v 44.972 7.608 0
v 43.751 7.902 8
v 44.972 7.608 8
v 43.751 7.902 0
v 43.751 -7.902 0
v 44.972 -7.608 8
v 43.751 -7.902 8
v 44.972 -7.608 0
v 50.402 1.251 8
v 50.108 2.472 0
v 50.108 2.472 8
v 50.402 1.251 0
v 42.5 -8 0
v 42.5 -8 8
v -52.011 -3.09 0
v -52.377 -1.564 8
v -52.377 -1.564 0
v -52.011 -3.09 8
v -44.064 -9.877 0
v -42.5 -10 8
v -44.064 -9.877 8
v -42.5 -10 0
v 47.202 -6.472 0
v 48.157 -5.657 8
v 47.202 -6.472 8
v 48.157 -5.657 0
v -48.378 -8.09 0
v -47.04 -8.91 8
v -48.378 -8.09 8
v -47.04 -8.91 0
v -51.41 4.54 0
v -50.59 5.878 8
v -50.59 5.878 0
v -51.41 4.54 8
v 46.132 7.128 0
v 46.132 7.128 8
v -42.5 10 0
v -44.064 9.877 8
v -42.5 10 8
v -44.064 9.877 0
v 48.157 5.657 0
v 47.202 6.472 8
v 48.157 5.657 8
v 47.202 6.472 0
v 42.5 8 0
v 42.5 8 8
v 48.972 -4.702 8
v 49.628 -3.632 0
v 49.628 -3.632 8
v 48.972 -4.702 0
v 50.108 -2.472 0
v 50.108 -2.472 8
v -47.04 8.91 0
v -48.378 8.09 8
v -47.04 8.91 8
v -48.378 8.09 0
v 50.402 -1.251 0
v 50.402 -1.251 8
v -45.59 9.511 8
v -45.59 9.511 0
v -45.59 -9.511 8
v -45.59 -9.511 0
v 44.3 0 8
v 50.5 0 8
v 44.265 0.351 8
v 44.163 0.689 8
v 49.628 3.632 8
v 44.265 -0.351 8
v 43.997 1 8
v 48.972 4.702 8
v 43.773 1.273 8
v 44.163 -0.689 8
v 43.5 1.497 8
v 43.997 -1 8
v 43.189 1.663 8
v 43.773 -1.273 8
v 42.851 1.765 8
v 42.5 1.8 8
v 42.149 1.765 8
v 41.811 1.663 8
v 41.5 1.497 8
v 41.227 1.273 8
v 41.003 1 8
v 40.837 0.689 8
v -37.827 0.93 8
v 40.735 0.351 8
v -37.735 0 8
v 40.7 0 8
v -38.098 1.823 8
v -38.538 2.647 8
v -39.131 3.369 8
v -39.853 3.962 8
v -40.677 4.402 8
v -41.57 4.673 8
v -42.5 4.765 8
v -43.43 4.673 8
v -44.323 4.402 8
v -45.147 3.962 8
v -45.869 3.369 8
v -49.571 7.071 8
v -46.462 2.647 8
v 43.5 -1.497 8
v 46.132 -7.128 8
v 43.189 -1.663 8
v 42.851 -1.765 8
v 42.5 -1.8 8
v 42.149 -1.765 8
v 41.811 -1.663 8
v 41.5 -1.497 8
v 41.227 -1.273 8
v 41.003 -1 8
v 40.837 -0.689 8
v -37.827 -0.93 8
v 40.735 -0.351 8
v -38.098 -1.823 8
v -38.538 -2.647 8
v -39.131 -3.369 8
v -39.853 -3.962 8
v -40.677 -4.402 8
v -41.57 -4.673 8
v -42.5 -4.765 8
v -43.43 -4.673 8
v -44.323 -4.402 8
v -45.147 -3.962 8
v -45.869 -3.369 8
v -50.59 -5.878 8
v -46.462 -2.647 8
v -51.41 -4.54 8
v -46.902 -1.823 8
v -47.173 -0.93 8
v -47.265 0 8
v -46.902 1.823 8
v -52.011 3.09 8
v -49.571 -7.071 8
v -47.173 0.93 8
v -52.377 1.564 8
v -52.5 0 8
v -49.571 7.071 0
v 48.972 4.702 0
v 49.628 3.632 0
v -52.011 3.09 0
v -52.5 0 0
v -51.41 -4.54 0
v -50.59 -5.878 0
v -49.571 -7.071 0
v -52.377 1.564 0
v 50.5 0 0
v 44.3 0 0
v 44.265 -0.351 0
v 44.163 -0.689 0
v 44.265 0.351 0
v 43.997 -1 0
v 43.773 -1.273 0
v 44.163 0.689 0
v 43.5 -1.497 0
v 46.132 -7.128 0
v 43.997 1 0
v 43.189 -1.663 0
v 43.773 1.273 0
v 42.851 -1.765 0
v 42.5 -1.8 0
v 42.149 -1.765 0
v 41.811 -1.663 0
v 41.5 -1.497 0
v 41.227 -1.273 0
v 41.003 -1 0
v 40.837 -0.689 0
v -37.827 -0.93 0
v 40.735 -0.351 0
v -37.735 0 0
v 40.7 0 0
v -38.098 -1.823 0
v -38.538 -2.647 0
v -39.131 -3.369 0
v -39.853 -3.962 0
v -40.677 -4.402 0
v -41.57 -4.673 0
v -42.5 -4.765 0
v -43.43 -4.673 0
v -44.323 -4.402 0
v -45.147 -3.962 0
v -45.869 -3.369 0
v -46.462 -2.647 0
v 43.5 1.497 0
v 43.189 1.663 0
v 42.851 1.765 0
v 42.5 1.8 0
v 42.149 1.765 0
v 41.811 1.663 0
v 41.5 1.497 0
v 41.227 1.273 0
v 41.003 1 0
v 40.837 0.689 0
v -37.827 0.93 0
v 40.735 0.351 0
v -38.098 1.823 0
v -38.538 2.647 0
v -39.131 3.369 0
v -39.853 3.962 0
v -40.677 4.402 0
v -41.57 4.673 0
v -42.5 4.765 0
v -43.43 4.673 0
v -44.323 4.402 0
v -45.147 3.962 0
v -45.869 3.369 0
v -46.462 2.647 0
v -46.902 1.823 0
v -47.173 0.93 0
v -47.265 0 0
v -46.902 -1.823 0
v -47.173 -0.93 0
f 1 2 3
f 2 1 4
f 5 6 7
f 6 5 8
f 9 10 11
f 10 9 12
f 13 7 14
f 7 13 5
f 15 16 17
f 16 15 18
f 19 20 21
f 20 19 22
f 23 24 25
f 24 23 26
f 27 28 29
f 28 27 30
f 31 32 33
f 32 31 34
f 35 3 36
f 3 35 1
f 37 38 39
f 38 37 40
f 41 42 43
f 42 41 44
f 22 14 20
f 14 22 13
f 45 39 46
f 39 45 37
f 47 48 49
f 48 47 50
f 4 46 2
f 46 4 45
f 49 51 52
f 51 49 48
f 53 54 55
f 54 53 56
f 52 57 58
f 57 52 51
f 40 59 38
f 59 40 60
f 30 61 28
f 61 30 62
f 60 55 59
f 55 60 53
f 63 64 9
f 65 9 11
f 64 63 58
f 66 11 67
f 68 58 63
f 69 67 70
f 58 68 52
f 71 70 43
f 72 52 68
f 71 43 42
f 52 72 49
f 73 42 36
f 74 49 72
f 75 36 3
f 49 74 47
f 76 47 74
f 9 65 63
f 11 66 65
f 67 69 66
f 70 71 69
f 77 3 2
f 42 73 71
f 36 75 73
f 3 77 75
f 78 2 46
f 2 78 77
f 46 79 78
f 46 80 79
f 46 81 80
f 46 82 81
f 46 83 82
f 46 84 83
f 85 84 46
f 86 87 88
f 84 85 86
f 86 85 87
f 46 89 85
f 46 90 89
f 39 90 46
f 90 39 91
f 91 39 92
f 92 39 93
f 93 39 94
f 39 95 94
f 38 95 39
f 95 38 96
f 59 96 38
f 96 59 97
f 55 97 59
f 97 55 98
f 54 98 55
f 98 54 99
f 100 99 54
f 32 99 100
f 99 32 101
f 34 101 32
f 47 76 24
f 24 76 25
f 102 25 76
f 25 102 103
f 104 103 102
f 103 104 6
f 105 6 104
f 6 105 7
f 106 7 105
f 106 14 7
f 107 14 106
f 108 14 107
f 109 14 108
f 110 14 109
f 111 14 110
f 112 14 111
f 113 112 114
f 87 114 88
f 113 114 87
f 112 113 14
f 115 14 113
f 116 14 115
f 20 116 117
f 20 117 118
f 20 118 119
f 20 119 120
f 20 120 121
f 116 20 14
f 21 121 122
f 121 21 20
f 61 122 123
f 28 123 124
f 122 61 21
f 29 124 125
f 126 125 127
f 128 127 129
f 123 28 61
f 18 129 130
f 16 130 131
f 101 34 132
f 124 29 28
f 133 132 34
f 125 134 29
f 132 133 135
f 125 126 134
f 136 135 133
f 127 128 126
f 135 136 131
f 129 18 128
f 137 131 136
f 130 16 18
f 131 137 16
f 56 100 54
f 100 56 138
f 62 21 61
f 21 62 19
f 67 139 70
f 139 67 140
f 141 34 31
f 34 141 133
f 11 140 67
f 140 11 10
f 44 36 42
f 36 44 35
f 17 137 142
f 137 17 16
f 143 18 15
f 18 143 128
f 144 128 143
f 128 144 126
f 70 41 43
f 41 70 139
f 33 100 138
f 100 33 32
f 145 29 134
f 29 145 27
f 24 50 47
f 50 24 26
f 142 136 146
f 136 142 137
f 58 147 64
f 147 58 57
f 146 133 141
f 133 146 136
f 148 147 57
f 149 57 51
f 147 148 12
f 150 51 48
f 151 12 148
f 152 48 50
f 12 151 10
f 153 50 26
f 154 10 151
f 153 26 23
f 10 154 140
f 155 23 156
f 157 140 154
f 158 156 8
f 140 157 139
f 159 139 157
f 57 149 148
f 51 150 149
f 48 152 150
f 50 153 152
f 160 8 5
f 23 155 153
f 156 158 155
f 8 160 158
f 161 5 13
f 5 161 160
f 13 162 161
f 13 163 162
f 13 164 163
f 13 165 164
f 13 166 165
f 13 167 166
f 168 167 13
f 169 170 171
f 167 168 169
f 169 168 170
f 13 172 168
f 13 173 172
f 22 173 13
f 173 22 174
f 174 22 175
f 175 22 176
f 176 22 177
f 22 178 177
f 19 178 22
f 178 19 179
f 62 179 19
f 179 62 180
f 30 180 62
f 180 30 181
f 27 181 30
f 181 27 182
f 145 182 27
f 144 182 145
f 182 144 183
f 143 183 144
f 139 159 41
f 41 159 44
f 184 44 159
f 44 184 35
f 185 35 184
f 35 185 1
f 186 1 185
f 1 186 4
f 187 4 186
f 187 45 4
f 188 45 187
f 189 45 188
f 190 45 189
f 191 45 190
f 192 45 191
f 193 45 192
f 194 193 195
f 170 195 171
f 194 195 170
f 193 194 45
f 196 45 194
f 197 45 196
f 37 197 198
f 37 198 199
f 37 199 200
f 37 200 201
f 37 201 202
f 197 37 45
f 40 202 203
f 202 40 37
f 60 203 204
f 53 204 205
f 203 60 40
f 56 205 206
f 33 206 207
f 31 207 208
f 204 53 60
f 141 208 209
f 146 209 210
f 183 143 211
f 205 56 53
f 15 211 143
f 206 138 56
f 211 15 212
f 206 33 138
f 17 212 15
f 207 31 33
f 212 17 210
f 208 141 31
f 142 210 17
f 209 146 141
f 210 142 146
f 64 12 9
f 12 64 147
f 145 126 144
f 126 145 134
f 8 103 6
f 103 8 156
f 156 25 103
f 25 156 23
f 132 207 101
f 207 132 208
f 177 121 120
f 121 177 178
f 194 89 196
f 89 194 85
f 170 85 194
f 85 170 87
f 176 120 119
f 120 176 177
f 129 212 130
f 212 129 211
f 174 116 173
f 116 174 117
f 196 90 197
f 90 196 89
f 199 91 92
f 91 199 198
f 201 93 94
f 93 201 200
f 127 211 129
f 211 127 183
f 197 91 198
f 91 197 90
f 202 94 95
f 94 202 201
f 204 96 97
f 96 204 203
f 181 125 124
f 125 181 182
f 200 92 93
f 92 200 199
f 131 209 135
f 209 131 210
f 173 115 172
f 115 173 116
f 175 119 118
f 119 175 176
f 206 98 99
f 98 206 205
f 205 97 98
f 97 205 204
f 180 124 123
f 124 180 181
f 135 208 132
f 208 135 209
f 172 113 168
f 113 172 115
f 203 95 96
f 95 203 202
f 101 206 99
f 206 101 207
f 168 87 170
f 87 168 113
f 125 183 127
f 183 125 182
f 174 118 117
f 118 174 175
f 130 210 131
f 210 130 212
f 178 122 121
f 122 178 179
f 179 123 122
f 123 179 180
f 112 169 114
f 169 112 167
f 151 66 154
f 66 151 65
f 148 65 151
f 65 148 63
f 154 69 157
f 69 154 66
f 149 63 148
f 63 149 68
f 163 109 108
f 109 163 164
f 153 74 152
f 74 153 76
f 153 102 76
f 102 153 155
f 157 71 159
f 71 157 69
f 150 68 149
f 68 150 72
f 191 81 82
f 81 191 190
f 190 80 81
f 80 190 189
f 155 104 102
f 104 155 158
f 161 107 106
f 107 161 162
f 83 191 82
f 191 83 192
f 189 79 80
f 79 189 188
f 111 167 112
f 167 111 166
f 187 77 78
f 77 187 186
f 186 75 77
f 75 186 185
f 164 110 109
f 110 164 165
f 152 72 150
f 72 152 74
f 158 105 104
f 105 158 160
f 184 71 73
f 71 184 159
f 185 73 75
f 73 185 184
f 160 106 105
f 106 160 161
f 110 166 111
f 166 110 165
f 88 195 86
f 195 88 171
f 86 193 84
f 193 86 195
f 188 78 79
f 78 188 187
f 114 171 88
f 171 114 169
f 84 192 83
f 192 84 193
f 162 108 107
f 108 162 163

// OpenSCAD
$fn = 32;

// ----------------------------------------------------------------------
// Lever: 85 mm between the bosses, 8 mm thick, smooth outline
// ----------------------------------------------------------------------

// --- parameters (mm) ---
lever_l = 85;             // distance between the boss centres
boss_a = 20;              // first boss diameter
boss_b = 16;              // second boss diameter
bore_a = 9.53;            // first bore
bore_b = 3.6;             // second bore
lever_t = 8;              // lever thickness

lever_profile = [[-52.5, 0], [-52.377, -1.564], [-52.011, -3.09], [-51.41, -4.54], [-50.59, -5.878], [-49.571, -7.071], [-48.378, -8.09], [-47.04, -8.91], [-45.59, -9.511], [-44.064, -9.877], [-42.5, -10], [42.5, -8], [43.751, -7.902], [44.972, -7.608], [46.132, -7.128], [47.202, -6.472], [48.157, -5.657], [48.972, -4.702], [49.628, -3.632], [50.108, -2.472], [50.402, -1.251], [50.5, 0], [50.402, 1.251], [50.108, 2.472], [49.628, 3.632], [48.972, 4.702], [48.157, 5.657], [47.202, 6.472], [46.132, 7.128], [44.972, 7.608], [43.751, 7.902], [42.5, 8], [-42.5, 10], [-44.064, 9.877], [-45.59, 9.511], [-47.04, 8.91], [-48.378, 8.09], [-49.571, 7.071], [-50.59, 5.878], [-51.41, 4.54], [-52.011, 3.09], [-52.377, 1.564]];

difference() {
  linear_extrude(height = lever_t) polygon(lever_profile);
  translate([-42.5, 0, -2.5]) cylinder(h = lever_t + 5, d = bore_a);
  translate([42.5, 0, -2.5]) cylinder(h = lever_t + 5, d = bore_b);
}
